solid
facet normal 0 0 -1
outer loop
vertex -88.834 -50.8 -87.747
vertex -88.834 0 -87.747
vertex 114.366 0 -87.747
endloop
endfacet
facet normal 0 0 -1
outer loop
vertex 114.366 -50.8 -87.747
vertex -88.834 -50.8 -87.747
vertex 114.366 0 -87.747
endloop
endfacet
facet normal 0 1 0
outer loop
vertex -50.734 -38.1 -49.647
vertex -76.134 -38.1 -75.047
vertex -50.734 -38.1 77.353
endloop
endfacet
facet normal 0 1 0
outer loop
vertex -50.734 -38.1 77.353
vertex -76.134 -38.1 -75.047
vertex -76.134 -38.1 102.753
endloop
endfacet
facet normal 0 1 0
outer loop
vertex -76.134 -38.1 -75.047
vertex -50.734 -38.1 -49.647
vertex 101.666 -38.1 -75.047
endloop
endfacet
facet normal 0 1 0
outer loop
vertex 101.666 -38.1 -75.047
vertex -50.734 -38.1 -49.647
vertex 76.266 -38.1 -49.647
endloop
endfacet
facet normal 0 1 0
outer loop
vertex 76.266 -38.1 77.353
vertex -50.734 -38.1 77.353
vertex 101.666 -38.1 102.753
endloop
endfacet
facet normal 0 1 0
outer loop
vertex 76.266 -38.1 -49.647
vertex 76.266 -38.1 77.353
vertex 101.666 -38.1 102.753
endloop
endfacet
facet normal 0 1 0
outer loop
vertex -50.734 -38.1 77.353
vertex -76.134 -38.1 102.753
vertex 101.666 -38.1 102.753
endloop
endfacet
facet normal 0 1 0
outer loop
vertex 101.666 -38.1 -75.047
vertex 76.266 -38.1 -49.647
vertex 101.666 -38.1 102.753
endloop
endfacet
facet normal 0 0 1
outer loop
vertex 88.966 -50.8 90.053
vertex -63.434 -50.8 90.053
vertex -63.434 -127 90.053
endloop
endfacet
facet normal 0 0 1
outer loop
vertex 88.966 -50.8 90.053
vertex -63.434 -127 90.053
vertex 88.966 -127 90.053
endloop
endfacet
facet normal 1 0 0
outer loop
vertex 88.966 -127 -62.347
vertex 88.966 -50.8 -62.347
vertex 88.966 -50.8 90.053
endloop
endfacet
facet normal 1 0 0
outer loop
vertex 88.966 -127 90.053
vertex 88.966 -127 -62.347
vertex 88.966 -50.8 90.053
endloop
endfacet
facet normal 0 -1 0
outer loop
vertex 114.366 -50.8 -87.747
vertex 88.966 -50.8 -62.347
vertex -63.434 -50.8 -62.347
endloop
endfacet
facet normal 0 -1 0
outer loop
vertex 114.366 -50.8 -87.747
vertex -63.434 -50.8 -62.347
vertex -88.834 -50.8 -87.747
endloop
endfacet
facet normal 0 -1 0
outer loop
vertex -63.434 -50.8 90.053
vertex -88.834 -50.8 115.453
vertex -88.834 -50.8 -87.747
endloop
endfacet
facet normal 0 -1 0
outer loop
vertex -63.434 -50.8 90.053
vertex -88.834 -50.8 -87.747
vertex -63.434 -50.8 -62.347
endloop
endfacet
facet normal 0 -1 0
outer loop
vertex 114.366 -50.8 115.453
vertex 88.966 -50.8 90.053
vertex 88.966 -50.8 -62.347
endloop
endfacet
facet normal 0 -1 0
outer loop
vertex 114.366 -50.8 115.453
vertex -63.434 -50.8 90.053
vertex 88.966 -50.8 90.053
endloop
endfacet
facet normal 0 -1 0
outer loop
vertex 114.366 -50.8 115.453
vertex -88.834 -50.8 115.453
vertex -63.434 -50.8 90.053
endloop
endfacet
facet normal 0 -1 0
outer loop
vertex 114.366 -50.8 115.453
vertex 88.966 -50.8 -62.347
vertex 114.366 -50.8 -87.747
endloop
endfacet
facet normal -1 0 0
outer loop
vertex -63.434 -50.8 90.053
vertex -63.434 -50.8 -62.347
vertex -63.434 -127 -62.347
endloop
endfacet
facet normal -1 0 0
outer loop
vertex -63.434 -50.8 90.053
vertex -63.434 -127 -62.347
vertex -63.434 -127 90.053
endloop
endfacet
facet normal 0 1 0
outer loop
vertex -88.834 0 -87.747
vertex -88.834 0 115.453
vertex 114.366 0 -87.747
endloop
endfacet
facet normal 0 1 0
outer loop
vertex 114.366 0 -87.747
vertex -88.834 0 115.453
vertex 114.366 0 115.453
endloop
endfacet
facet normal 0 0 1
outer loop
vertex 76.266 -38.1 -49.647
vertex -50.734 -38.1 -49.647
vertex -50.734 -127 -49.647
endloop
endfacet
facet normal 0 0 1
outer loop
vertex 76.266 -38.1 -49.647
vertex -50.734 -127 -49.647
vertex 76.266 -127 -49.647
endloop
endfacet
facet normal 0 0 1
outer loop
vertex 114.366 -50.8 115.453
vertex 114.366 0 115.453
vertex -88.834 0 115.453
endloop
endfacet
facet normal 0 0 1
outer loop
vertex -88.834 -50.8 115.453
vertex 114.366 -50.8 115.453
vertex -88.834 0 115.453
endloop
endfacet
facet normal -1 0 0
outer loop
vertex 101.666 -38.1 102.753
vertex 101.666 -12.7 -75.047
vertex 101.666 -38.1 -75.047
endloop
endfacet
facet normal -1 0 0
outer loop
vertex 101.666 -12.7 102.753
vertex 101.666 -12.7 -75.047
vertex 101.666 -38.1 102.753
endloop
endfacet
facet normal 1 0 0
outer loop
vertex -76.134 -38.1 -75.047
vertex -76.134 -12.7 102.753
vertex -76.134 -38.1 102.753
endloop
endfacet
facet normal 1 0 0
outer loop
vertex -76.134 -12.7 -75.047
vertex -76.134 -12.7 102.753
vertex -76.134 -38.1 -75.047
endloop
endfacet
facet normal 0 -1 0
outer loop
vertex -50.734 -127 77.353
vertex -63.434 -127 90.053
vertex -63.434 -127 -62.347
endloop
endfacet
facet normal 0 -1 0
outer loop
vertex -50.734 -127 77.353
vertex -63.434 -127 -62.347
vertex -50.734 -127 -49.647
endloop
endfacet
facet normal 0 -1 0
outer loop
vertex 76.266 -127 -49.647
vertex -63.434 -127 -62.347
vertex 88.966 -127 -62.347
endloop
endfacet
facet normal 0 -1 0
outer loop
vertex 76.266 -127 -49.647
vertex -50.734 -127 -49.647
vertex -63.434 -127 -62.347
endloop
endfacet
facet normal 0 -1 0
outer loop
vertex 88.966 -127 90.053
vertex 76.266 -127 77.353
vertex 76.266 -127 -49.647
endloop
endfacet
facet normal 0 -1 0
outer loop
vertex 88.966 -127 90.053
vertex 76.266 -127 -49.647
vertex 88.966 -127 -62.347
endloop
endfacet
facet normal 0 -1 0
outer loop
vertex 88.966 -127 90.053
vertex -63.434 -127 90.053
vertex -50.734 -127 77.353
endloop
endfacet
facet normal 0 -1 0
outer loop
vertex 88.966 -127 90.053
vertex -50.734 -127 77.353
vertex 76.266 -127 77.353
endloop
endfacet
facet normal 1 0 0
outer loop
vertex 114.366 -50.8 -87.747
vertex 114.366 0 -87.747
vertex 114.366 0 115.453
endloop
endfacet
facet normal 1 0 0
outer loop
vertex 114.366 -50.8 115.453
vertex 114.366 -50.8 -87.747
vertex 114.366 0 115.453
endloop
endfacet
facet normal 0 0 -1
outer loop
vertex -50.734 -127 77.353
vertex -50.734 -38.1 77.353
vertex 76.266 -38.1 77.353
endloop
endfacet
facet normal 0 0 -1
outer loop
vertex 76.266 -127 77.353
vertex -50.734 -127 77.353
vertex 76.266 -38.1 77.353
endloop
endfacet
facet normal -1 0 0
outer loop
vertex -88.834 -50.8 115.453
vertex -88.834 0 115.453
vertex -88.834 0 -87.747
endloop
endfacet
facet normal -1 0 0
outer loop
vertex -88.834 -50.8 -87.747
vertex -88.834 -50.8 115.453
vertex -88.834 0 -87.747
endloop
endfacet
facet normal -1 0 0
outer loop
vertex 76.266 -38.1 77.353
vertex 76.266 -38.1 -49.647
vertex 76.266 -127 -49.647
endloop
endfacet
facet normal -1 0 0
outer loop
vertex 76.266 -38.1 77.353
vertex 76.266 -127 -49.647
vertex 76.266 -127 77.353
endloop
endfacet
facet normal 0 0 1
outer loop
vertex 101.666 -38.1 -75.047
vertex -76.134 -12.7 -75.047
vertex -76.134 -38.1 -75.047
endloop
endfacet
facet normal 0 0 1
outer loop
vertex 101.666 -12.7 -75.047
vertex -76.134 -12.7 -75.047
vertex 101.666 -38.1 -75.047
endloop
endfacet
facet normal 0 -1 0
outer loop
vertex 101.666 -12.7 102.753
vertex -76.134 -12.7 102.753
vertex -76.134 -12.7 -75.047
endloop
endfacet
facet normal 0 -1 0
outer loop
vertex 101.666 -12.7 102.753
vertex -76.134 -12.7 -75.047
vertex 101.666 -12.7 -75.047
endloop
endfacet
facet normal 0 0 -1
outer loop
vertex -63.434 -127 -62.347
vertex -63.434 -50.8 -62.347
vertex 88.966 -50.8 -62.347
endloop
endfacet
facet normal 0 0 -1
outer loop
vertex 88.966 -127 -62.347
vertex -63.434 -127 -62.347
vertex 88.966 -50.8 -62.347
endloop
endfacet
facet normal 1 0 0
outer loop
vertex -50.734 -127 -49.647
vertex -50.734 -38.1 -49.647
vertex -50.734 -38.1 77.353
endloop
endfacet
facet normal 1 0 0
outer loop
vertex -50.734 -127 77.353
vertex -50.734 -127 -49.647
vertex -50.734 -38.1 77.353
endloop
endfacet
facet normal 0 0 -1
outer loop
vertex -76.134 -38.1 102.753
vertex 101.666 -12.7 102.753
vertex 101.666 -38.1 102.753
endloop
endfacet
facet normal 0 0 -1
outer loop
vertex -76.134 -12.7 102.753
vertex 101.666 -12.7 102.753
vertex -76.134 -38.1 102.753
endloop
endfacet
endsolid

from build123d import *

# Parameters (mm, degrees)
F0_W     = 152.4
F0_H     = 152.4
F1_DEPTH = 127
F0_H_2   = 25.4
F0_W_2   = 25.4
F2_DEPTH = 50.8
F3_T     = -12.7


with BuildPart() as f1:
    # F0 (on Front) → F1 (new body)
    with BuildSketch(Plane.XZ):
        with Locations((12.7657866001, 13.8525208354)):
            Rectangle(F0_W, F0_H)
    extrude(amount=F1_DEPTH)

    # F0 (on Front) → F2 (join)
    with BuildSketch(Plane.XZ):
        with Locations((12.7657866001, 102.7525208354)):
            Rectangle(F0_W, F0_H_2)
        with Locations((-76.1342133999, 13.8525208354)):
            Rectangle(F0_W_2, F0_H)
        with Locations((-76.1342133999, 102.7525208354)):
            Rectangle(F0_W_2, F0_H_2)
        with Locations((12.7657866001, -75.0474791646)):
            Rectangle(F0_W, F0_H_2)
        with Locations((-76.1342133999, -75.0474791646)):
            Rectangle(F0_W_2, F0_H_2)
        with Locations((101.6657866001, 13.8525208354)):
            Rectangle(F0_W_2, F0_H)
        with Locations((101.6657866001, 102.7525208354)):
            Rectangle(F0_W_2, F0_H_2)
        with Locations((101.6657866001, -75.0474791646)):
            Rectangle(F0_W_2, F0_H_2)
    extrude(amount=F2_DEPTH)

    # F3
    f3_openings = [f1.faces().sort_by_distance(p)[0] for p in [
        (12.765787, -127, 13.852521),
    ]]
    offset(amount=F3_T, openings=f3_openings, kind=Kind.INTERSECTION)


solid = f1.part
